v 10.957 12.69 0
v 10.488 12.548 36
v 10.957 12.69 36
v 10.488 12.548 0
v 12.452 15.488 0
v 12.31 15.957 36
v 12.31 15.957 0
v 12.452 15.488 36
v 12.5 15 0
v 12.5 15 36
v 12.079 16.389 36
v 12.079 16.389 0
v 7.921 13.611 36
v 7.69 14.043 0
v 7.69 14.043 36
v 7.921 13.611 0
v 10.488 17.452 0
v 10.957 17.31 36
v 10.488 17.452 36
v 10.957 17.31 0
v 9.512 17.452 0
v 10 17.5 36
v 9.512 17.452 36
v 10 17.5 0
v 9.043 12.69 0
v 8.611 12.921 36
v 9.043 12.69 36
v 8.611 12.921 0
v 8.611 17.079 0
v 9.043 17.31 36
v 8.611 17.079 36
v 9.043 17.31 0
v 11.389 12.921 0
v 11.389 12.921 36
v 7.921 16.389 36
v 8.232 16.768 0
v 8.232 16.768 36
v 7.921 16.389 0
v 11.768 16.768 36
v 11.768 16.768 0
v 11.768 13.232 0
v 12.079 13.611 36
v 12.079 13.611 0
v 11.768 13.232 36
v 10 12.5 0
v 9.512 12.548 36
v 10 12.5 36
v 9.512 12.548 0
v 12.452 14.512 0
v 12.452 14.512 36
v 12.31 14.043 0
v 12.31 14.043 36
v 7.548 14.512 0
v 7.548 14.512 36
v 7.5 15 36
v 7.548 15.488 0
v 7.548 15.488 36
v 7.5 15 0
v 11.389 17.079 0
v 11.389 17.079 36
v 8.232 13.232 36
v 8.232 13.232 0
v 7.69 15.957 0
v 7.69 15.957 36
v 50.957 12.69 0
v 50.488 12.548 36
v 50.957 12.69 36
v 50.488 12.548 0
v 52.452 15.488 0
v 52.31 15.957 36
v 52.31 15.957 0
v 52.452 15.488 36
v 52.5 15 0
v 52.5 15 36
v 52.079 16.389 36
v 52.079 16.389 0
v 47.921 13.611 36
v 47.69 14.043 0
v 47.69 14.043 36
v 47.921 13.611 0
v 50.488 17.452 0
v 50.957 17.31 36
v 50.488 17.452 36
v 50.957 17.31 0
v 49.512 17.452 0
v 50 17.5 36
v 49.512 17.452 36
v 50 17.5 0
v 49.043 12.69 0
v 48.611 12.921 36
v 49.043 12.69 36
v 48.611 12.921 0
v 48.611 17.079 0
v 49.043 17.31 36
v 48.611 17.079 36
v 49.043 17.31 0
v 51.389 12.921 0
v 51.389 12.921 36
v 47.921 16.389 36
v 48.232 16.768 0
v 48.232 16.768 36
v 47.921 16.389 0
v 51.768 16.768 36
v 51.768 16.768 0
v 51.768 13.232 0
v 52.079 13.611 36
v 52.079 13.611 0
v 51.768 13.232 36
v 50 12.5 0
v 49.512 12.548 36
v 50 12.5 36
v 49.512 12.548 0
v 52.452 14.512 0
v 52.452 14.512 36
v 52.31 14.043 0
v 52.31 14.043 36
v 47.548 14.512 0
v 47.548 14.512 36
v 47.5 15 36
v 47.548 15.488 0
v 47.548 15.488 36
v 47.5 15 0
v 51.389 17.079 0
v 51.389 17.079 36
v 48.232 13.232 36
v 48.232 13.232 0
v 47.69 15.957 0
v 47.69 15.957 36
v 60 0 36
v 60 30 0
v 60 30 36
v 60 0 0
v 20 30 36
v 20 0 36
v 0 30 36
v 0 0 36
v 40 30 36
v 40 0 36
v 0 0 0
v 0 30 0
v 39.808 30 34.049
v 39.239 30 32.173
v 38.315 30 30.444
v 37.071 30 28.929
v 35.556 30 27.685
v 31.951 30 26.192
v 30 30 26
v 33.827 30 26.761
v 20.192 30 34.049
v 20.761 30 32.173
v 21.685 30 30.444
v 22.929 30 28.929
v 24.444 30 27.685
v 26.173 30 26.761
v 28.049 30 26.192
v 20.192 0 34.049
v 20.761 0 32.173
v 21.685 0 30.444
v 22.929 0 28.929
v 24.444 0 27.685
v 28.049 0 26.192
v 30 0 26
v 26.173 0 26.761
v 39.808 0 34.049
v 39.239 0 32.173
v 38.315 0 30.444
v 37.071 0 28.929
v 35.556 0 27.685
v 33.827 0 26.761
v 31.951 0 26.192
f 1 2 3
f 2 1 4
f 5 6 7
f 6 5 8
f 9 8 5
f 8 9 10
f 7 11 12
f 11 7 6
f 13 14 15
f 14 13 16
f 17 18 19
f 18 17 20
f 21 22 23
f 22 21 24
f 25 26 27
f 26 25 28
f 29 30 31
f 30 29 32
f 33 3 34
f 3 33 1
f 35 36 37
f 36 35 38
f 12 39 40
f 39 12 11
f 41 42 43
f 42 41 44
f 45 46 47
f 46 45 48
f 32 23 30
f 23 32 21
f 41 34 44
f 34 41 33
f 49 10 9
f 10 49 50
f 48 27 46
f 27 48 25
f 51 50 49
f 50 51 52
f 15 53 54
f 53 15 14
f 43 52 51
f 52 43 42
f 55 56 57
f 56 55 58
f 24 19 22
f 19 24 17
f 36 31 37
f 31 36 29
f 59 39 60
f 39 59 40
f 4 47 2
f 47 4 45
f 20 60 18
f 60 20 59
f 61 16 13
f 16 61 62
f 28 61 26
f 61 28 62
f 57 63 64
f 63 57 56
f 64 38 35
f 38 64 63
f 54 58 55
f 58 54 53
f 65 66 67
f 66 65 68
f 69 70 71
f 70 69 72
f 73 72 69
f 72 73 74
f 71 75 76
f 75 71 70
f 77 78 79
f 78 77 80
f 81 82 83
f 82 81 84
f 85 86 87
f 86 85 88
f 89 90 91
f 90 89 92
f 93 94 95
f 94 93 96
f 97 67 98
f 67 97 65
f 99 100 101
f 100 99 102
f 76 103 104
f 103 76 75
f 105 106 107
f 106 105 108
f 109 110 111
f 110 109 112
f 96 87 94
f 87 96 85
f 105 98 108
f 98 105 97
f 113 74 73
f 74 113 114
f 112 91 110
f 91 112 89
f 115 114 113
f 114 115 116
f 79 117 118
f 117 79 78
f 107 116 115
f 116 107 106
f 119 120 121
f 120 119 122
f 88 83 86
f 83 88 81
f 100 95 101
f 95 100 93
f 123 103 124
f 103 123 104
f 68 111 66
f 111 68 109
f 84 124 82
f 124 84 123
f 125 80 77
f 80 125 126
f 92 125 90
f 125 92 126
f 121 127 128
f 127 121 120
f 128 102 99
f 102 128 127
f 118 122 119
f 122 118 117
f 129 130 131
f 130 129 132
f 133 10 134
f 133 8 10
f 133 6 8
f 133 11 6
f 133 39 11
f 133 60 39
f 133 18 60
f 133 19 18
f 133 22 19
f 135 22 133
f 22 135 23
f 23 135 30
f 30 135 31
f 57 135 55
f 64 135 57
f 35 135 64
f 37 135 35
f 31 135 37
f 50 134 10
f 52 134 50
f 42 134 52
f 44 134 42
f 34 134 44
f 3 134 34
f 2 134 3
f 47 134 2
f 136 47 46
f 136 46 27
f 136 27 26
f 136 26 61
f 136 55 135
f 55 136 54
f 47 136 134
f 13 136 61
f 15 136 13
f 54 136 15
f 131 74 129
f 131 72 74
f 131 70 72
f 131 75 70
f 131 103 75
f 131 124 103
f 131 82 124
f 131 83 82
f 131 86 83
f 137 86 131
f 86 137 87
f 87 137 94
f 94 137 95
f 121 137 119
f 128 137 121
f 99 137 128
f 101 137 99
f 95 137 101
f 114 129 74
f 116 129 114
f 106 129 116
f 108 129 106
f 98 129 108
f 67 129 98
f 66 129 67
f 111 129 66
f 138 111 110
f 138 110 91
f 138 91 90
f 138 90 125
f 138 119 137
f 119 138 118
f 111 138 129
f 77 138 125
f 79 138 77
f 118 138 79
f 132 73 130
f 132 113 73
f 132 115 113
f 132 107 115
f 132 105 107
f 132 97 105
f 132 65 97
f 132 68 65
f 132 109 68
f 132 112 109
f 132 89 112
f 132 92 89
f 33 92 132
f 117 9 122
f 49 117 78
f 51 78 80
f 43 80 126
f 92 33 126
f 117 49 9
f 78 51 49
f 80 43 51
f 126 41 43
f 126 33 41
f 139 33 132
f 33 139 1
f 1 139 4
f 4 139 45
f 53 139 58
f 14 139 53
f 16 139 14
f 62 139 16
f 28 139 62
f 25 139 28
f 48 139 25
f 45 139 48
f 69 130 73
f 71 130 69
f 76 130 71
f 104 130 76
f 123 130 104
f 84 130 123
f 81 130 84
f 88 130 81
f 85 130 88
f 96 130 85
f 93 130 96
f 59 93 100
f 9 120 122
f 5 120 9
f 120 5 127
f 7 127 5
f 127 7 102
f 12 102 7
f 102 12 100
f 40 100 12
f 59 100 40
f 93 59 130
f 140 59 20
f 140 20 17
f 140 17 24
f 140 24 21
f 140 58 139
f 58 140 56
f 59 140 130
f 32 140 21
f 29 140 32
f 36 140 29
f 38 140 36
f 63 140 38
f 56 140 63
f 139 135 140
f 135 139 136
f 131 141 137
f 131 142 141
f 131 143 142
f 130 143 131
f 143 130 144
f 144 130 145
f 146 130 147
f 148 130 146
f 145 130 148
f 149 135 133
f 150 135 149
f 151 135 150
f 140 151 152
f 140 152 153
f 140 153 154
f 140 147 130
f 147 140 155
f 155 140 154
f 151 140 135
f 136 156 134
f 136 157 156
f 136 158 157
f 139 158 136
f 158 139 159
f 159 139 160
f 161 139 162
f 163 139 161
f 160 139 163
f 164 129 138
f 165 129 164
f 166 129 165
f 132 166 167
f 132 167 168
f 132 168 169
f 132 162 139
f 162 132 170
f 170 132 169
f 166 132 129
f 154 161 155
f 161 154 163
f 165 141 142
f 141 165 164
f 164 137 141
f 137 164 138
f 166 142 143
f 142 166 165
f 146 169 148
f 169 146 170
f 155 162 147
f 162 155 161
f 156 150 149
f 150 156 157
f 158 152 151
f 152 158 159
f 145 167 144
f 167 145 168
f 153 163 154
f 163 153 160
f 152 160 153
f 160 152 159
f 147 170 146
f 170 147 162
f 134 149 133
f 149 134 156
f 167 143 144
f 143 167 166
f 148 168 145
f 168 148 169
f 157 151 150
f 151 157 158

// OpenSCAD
$fn = 32;

// ----------------------------------------------------------------------
// Saddle clamp: plain shaft clamp
// ----------------------------------------------------------------------

// --- parameters (mm) ---
blk_l = 60;               // block length, X
blk_w = 30;               // block width, Y
blk_h = 36;               // block height
clamp_r = 10;             // shaft groove radius
hole_r = 2.5;             // bolt hole radius
hole_m = 10;              // bolt hole margin from the ends

saw_depth = clamp_r + 3;  // saw kerf depth

difference() {
  cube([blk_l, blk_w, blk_h]);
  translate([blk_l / 2, -1, blk_h])
    rotate([-90, 0, 0])
      cylinder(h = blk_w + 2, r = clamp_r);
  for (sx = [0, 1])
    translate([sx ? blk_l - hole_m : hole_m, blk_w / 2, -1])
      cylinder(r = hole_r, h = blk_h + 2);
}
